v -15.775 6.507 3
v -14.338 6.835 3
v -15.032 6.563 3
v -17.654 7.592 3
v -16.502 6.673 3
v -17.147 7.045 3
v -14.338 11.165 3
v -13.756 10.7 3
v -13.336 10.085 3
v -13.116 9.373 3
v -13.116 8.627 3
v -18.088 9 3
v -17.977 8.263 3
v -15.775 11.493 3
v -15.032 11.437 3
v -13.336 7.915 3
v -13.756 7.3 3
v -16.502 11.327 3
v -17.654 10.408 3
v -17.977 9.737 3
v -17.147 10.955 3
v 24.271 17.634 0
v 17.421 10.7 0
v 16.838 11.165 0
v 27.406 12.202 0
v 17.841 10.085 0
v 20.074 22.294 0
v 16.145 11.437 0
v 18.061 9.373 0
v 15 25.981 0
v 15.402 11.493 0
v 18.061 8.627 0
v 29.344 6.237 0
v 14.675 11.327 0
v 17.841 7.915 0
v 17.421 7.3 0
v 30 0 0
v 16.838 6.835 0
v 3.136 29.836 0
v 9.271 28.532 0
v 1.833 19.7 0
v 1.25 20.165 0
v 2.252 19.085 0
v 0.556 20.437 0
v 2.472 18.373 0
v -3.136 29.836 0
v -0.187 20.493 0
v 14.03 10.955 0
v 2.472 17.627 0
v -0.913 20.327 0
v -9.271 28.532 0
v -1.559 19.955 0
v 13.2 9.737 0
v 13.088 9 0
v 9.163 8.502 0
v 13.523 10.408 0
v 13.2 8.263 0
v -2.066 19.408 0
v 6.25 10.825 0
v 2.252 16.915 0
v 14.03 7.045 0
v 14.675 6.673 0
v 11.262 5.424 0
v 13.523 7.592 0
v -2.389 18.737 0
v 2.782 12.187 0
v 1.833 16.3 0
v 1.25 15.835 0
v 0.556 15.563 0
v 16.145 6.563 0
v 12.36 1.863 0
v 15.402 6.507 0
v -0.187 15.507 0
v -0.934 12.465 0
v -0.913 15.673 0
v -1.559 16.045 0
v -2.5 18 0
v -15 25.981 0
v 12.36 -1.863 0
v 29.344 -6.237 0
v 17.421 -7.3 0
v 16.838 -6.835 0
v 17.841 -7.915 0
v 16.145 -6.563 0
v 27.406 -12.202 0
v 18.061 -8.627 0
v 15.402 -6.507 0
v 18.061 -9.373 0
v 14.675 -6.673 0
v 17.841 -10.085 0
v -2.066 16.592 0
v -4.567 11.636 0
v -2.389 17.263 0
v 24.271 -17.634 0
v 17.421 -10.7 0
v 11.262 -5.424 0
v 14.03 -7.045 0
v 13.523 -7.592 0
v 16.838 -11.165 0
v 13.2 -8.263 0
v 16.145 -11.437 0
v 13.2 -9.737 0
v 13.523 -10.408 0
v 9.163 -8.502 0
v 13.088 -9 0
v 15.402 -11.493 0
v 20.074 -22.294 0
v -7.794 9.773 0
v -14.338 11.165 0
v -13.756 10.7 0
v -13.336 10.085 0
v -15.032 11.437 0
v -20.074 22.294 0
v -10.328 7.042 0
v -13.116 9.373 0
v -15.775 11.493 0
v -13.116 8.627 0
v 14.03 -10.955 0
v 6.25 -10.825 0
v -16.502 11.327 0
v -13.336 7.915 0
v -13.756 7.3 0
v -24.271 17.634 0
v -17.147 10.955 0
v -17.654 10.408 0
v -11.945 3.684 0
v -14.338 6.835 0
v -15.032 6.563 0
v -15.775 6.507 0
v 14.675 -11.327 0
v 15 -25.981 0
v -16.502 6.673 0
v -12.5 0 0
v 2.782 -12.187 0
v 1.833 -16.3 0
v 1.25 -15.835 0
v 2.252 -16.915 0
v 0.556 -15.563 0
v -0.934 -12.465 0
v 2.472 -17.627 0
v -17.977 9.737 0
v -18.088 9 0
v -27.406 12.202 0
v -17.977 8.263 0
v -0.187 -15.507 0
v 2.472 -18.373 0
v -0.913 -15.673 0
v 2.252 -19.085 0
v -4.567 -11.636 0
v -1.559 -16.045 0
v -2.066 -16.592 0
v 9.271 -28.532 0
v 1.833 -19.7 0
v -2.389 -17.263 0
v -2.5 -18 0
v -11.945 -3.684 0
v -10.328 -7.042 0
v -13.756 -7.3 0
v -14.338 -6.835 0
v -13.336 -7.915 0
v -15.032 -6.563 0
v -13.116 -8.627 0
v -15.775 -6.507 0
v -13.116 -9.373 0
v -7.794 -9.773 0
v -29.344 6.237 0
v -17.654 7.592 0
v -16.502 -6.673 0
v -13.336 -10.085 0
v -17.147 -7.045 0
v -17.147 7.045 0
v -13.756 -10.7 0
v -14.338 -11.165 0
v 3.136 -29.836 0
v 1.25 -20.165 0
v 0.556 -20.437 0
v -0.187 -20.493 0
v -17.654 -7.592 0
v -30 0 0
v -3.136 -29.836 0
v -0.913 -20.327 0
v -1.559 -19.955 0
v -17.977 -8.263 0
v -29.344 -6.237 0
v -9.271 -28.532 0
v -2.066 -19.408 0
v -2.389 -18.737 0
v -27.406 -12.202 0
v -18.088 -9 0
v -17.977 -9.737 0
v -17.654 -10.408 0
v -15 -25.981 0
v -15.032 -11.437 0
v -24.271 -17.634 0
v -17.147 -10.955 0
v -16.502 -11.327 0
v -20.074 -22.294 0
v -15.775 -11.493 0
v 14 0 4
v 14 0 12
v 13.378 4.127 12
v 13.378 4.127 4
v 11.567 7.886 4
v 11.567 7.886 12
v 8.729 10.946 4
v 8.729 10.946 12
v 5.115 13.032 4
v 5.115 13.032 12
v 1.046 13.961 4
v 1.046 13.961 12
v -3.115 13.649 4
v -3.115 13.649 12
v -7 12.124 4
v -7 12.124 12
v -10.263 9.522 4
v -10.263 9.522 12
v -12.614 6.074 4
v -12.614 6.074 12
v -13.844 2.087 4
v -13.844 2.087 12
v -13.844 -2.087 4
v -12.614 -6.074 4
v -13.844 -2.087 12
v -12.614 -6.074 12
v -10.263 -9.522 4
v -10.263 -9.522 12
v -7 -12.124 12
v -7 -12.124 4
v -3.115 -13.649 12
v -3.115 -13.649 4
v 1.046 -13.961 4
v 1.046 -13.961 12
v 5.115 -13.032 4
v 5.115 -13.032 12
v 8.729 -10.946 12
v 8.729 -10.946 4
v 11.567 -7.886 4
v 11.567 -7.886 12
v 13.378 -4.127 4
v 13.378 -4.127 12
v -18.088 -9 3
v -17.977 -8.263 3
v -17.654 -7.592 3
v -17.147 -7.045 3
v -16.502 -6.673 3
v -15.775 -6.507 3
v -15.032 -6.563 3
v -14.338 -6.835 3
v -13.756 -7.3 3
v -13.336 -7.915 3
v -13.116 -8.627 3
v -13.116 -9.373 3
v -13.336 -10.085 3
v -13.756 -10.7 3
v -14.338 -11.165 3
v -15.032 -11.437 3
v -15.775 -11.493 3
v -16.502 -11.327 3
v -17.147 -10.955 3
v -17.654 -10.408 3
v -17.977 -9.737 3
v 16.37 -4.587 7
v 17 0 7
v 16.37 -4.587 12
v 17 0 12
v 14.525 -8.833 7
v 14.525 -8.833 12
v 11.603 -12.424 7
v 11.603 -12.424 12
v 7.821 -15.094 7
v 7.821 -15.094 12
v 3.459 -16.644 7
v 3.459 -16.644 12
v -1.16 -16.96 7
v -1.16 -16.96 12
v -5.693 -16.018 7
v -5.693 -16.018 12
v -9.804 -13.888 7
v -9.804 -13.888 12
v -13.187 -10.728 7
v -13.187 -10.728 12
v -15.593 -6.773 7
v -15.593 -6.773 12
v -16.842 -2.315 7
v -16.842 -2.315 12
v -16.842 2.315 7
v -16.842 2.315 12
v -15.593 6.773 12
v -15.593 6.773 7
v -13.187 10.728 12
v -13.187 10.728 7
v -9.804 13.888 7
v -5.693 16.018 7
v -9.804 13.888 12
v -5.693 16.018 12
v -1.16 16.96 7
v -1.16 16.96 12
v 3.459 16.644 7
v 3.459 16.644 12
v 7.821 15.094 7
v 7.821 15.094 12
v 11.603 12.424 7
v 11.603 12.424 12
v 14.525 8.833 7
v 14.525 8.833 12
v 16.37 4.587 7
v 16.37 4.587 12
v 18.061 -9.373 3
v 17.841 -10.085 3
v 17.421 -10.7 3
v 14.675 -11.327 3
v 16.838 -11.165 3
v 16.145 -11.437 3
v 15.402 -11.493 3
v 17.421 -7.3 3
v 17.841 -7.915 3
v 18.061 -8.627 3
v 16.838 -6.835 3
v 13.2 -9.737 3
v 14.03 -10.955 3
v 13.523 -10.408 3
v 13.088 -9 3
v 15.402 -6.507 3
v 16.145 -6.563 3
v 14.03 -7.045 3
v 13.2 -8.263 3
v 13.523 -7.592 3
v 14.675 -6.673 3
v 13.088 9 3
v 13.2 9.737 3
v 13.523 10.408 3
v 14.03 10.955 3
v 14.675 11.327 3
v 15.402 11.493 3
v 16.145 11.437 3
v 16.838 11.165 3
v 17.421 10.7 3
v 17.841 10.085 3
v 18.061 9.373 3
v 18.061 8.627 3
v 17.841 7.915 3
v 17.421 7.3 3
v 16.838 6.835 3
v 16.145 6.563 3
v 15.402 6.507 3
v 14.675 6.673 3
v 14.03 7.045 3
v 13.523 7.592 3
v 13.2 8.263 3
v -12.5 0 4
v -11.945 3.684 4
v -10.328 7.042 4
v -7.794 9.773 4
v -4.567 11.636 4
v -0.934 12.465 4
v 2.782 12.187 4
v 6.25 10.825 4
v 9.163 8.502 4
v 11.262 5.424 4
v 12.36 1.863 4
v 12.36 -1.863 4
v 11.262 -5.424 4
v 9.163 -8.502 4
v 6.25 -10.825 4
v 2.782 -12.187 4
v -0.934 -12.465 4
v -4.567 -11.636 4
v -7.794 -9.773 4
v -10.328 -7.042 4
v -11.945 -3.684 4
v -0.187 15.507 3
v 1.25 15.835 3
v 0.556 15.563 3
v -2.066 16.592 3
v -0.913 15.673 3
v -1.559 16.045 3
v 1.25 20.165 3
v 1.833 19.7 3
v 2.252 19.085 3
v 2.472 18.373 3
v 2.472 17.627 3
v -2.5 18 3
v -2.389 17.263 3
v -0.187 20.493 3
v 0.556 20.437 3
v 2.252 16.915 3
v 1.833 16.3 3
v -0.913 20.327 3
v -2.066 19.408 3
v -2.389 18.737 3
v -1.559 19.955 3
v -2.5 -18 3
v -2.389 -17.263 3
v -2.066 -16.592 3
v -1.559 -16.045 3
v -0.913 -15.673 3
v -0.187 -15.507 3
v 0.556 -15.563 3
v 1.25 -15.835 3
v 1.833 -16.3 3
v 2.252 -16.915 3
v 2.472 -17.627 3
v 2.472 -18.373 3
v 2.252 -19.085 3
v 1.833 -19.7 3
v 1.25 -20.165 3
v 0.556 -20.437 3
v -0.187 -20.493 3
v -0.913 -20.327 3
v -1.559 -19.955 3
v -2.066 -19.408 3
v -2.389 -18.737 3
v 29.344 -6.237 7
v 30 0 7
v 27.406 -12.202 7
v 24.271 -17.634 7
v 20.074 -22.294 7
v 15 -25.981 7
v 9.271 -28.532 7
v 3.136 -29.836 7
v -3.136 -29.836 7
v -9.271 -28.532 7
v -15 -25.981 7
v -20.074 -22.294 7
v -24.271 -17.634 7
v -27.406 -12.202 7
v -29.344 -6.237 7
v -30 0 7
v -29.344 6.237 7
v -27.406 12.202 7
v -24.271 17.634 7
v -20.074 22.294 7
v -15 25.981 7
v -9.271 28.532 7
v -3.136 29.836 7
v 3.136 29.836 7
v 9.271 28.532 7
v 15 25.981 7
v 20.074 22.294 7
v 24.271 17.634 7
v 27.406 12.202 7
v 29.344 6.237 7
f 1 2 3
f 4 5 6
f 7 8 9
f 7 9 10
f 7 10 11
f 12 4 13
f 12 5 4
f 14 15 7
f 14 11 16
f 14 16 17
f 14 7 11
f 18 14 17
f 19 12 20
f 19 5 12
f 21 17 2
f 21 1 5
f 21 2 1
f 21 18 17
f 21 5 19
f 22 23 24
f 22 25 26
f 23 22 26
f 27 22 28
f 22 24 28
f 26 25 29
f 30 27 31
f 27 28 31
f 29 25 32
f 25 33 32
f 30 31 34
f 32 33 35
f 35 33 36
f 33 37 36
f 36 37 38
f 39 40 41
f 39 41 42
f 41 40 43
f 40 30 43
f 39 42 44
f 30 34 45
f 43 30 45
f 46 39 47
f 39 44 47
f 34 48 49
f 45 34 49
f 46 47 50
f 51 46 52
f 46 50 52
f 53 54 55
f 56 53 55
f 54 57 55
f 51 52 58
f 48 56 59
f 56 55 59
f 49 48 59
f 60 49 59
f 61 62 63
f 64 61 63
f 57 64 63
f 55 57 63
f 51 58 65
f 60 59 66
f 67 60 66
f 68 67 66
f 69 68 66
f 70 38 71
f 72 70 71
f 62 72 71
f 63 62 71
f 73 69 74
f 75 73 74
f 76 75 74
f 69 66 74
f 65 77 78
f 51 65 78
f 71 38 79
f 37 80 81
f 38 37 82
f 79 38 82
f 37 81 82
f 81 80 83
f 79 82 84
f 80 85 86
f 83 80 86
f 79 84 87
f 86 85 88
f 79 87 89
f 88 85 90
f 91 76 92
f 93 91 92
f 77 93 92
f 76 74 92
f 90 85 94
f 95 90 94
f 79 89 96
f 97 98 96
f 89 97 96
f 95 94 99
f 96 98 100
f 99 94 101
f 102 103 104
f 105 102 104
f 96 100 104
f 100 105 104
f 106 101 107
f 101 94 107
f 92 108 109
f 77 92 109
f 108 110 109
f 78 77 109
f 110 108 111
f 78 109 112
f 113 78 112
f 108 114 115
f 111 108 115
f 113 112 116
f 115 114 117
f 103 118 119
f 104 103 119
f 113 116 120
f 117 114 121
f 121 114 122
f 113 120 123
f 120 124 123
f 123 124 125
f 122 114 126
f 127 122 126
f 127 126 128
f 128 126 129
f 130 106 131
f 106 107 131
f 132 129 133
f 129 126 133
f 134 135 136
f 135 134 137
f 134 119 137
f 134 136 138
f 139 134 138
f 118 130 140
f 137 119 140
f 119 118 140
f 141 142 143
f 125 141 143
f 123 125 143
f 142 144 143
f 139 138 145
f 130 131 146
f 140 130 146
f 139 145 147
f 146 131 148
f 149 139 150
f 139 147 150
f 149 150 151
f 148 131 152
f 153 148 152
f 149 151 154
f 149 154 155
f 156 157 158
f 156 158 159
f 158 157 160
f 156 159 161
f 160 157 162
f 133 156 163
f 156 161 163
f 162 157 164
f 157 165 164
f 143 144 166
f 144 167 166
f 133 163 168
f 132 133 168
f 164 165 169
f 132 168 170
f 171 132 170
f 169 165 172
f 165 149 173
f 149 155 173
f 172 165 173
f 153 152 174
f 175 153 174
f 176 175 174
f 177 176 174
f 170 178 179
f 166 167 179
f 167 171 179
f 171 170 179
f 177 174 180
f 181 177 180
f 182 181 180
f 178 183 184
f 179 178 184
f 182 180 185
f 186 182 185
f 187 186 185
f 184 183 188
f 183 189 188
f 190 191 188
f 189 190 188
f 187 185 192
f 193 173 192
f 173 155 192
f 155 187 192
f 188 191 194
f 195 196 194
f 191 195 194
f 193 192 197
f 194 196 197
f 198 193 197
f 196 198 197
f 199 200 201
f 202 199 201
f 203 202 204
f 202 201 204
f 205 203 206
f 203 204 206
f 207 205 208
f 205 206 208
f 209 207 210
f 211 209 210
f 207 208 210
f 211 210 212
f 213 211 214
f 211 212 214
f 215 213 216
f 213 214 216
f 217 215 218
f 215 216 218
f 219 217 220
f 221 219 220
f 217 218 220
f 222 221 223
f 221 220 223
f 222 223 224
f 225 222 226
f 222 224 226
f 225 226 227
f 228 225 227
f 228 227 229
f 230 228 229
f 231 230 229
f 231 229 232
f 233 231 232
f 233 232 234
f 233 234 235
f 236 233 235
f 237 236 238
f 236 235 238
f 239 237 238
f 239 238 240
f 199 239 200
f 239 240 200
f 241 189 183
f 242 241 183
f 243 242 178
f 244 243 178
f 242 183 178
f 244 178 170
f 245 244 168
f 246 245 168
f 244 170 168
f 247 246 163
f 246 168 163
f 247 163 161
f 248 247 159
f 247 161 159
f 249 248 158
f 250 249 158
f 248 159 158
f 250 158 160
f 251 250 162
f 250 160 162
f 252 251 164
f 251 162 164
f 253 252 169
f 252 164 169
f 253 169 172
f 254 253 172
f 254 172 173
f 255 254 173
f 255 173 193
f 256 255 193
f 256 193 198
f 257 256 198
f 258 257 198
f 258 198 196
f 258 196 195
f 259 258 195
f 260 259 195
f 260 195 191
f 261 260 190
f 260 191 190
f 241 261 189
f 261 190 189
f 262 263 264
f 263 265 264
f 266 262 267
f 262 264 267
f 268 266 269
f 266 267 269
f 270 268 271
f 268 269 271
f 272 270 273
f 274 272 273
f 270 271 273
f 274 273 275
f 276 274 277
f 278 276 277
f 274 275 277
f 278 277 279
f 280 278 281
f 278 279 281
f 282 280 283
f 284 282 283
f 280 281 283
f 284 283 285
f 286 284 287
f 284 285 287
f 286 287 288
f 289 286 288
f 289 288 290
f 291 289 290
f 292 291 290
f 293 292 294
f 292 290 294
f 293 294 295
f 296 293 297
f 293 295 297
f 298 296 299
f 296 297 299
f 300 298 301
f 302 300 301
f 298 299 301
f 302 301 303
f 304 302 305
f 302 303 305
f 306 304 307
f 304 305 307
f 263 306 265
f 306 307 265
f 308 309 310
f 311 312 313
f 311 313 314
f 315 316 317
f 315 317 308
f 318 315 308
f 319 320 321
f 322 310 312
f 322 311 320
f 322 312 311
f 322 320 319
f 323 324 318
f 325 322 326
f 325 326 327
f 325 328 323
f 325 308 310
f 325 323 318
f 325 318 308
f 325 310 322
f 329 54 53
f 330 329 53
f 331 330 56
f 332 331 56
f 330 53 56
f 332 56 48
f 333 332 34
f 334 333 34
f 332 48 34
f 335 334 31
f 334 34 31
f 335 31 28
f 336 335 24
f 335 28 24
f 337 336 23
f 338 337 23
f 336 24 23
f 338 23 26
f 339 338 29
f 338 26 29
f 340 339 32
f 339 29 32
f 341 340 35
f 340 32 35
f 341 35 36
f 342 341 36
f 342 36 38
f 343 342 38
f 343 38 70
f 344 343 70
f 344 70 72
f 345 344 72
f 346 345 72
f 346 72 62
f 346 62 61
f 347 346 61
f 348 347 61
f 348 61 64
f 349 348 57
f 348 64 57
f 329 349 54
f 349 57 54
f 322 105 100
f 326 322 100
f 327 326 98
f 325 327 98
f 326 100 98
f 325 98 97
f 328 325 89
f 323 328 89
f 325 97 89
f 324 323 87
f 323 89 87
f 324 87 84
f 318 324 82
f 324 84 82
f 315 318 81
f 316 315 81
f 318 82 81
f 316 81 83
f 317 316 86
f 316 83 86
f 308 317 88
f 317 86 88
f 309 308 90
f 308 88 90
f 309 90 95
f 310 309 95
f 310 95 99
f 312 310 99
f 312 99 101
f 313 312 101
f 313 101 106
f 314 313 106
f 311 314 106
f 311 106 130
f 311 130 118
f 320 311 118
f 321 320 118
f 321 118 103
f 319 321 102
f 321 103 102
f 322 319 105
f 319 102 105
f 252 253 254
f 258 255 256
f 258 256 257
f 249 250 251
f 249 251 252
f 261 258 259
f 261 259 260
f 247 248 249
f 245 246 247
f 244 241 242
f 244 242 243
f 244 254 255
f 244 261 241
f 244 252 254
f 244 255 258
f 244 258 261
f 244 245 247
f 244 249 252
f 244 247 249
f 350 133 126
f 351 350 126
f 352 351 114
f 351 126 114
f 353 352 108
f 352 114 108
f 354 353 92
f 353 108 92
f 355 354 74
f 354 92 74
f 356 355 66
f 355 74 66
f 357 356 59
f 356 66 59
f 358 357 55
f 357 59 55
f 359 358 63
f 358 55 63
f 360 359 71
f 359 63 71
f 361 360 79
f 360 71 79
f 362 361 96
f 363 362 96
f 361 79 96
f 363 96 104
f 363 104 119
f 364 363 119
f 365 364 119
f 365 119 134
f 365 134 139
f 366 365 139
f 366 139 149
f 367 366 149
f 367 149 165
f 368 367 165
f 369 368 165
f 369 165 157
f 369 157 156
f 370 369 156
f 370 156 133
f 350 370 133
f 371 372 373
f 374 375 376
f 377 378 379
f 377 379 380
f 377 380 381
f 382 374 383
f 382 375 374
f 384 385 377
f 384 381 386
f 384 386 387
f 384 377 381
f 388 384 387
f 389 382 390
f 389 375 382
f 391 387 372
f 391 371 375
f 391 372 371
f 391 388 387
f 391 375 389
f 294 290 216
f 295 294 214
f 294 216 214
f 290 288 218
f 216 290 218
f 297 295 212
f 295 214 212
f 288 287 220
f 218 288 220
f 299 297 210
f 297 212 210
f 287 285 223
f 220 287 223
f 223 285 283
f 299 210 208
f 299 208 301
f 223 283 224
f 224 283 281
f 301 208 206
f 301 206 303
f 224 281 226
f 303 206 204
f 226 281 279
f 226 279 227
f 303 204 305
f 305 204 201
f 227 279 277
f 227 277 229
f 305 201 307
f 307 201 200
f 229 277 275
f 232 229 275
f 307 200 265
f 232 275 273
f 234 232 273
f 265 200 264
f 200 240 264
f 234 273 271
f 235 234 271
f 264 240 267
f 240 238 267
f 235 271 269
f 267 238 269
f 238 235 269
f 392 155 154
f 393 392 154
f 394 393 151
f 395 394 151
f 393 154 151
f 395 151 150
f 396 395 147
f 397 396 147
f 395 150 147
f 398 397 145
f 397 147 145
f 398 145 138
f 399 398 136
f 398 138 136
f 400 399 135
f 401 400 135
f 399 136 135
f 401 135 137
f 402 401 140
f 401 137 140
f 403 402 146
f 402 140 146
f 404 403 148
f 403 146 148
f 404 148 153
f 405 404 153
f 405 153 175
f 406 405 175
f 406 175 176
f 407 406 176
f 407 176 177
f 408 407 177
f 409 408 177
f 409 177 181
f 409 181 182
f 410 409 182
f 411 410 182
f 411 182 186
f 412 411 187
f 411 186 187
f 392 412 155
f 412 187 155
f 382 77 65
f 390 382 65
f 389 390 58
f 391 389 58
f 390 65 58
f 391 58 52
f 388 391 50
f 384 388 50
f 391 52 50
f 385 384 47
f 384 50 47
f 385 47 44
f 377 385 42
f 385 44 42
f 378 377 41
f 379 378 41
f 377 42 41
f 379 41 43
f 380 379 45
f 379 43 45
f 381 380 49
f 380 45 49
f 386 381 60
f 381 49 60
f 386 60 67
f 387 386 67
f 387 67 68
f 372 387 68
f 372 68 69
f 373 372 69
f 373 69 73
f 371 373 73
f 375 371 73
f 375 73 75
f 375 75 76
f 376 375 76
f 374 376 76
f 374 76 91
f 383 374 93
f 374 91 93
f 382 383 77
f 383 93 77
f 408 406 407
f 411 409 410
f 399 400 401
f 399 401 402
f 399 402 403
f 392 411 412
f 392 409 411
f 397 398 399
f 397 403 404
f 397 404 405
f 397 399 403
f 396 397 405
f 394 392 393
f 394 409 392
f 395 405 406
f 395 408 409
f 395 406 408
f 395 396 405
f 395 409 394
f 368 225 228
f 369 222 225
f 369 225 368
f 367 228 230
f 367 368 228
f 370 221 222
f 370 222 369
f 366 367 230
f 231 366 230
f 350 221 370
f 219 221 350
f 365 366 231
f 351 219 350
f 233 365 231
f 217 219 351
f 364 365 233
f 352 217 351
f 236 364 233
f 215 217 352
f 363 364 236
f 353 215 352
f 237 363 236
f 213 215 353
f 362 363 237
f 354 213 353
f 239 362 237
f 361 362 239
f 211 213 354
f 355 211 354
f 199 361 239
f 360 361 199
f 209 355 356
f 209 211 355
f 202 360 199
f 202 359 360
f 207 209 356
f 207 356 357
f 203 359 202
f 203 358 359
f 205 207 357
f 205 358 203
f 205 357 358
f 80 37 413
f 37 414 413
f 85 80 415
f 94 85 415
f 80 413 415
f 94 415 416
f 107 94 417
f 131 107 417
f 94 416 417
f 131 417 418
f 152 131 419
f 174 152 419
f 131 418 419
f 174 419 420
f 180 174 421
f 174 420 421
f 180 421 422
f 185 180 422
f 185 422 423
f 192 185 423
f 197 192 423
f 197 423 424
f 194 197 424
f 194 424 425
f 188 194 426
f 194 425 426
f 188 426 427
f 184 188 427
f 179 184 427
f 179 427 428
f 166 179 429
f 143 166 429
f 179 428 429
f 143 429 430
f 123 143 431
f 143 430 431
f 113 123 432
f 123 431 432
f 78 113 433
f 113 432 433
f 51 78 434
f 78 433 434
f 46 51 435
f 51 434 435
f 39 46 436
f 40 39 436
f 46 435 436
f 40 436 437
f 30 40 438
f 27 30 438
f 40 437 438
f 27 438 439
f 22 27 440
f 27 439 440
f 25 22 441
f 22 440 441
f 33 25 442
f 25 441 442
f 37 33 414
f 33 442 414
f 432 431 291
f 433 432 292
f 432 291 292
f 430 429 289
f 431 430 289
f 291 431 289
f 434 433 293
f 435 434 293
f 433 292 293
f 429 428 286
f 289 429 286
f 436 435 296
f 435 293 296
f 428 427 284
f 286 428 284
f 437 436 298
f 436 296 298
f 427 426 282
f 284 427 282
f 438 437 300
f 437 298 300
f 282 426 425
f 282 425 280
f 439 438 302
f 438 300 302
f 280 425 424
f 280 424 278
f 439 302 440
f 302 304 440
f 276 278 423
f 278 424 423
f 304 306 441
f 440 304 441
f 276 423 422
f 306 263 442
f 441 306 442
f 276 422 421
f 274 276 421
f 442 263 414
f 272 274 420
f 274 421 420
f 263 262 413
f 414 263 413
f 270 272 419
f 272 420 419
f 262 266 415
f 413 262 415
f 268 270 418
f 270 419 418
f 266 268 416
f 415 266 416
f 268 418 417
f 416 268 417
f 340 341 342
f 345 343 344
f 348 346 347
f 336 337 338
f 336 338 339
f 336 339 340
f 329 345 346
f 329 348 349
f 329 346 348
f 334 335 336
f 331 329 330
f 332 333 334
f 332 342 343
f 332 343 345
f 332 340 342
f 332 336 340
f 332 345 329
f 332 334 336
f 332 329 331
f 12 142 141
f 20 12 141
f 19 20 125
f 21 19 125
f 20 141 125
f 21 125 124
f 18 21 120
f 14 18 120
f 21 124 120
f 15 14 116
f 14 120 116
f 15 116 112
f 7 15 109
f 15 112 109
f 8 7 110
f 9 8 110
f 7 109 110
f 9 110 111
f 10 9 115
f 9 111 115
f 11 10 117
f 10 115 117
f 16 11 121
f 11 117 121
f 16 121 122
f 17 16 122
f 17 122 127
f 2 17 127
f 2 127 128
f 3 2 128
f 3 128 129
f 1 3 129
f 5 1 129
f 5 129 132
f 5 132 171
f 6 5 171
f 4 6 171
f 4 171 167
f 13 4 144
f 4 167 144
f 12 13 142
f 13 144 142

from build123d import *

# Parameters (mm, degrees)
SKETCH4_R          = 14
CUT_EXTRUDE1_DEPTH = 8
SKETCH5_R          = 12.5
CUT_EXTRUDE4_DEPTH = 8.1
SKETCH7_R          = 2.5
CUT_EXTRUDE5_DEPTH = 3


with BuildPart() as part:
    # Sketch2 → Revolve4 (revolve)
    with BuildSketch(Plane(origin=(0, 0, 0), x_dir=(1, 0, 0), z_dir=(0, 1, 0)), mode=Mode.PRIVATE) as revolve4_sk:
        Polygon((0, 0), (-30, 0), (-30, -7), (-17, -7), (-17, -12), (0, -12), align=None)
    revolve(revolve4_sk.sketch.rotate(Axis((0, 0, 12), (0, 0, -1)), 180), axis=Axis((0, 0, 12), (0, 0, -1)))

    # Sketch4 → Cut-Extrude1 (cut)
    with BuildSketch(Plane.XY.offset(12)):
        Circle(SKETCH4_R)
    extrude(amount=-CUT_EXTRUDE1_DEPTH, mode=Mode.SUBTRACT)

    # Sketch5 → Cut-Extrude4 (cut)
    with BuildSketch(Plane(origin=(0, 0, 0), x_dir=(-1, 0, 0), z_dir=(0, 0, -1))):
        Circle(SKETCH5_R)
    extrude(amount=-CUT_EXTRUDE4_DEPTH, mode=Mode.SUBTRACT)

    # Sketch7 → Cut-Extrude5 (cut)
    with BuildSketch(Plane(origin=(0, 0, 0), x_dir=(-1, 0, 0), z_dir=(0, 0, -1))):
        with Locations((0, 18)):
            Circle(SKETCH7_R)
        with Locations((15.588457268, 9)):
            Circle(SKETCH7_R)
        with Locations((15.588457268, -9)):
            Circle(SKETCH7_R)
        with Locations((0, -18)):
            Circle(SKETCH7_R)
        with Locations((-15.588457268, -9)):
            Circle(SKETCH7_R)
        with Locations((-15.588457268, 9)):
            Circle(SKETCH7_R)
    extrude(amount=-CUT_EXTRUDE5_DEPTH, mode=Mode.SUBTRACT)


solid = part.part
